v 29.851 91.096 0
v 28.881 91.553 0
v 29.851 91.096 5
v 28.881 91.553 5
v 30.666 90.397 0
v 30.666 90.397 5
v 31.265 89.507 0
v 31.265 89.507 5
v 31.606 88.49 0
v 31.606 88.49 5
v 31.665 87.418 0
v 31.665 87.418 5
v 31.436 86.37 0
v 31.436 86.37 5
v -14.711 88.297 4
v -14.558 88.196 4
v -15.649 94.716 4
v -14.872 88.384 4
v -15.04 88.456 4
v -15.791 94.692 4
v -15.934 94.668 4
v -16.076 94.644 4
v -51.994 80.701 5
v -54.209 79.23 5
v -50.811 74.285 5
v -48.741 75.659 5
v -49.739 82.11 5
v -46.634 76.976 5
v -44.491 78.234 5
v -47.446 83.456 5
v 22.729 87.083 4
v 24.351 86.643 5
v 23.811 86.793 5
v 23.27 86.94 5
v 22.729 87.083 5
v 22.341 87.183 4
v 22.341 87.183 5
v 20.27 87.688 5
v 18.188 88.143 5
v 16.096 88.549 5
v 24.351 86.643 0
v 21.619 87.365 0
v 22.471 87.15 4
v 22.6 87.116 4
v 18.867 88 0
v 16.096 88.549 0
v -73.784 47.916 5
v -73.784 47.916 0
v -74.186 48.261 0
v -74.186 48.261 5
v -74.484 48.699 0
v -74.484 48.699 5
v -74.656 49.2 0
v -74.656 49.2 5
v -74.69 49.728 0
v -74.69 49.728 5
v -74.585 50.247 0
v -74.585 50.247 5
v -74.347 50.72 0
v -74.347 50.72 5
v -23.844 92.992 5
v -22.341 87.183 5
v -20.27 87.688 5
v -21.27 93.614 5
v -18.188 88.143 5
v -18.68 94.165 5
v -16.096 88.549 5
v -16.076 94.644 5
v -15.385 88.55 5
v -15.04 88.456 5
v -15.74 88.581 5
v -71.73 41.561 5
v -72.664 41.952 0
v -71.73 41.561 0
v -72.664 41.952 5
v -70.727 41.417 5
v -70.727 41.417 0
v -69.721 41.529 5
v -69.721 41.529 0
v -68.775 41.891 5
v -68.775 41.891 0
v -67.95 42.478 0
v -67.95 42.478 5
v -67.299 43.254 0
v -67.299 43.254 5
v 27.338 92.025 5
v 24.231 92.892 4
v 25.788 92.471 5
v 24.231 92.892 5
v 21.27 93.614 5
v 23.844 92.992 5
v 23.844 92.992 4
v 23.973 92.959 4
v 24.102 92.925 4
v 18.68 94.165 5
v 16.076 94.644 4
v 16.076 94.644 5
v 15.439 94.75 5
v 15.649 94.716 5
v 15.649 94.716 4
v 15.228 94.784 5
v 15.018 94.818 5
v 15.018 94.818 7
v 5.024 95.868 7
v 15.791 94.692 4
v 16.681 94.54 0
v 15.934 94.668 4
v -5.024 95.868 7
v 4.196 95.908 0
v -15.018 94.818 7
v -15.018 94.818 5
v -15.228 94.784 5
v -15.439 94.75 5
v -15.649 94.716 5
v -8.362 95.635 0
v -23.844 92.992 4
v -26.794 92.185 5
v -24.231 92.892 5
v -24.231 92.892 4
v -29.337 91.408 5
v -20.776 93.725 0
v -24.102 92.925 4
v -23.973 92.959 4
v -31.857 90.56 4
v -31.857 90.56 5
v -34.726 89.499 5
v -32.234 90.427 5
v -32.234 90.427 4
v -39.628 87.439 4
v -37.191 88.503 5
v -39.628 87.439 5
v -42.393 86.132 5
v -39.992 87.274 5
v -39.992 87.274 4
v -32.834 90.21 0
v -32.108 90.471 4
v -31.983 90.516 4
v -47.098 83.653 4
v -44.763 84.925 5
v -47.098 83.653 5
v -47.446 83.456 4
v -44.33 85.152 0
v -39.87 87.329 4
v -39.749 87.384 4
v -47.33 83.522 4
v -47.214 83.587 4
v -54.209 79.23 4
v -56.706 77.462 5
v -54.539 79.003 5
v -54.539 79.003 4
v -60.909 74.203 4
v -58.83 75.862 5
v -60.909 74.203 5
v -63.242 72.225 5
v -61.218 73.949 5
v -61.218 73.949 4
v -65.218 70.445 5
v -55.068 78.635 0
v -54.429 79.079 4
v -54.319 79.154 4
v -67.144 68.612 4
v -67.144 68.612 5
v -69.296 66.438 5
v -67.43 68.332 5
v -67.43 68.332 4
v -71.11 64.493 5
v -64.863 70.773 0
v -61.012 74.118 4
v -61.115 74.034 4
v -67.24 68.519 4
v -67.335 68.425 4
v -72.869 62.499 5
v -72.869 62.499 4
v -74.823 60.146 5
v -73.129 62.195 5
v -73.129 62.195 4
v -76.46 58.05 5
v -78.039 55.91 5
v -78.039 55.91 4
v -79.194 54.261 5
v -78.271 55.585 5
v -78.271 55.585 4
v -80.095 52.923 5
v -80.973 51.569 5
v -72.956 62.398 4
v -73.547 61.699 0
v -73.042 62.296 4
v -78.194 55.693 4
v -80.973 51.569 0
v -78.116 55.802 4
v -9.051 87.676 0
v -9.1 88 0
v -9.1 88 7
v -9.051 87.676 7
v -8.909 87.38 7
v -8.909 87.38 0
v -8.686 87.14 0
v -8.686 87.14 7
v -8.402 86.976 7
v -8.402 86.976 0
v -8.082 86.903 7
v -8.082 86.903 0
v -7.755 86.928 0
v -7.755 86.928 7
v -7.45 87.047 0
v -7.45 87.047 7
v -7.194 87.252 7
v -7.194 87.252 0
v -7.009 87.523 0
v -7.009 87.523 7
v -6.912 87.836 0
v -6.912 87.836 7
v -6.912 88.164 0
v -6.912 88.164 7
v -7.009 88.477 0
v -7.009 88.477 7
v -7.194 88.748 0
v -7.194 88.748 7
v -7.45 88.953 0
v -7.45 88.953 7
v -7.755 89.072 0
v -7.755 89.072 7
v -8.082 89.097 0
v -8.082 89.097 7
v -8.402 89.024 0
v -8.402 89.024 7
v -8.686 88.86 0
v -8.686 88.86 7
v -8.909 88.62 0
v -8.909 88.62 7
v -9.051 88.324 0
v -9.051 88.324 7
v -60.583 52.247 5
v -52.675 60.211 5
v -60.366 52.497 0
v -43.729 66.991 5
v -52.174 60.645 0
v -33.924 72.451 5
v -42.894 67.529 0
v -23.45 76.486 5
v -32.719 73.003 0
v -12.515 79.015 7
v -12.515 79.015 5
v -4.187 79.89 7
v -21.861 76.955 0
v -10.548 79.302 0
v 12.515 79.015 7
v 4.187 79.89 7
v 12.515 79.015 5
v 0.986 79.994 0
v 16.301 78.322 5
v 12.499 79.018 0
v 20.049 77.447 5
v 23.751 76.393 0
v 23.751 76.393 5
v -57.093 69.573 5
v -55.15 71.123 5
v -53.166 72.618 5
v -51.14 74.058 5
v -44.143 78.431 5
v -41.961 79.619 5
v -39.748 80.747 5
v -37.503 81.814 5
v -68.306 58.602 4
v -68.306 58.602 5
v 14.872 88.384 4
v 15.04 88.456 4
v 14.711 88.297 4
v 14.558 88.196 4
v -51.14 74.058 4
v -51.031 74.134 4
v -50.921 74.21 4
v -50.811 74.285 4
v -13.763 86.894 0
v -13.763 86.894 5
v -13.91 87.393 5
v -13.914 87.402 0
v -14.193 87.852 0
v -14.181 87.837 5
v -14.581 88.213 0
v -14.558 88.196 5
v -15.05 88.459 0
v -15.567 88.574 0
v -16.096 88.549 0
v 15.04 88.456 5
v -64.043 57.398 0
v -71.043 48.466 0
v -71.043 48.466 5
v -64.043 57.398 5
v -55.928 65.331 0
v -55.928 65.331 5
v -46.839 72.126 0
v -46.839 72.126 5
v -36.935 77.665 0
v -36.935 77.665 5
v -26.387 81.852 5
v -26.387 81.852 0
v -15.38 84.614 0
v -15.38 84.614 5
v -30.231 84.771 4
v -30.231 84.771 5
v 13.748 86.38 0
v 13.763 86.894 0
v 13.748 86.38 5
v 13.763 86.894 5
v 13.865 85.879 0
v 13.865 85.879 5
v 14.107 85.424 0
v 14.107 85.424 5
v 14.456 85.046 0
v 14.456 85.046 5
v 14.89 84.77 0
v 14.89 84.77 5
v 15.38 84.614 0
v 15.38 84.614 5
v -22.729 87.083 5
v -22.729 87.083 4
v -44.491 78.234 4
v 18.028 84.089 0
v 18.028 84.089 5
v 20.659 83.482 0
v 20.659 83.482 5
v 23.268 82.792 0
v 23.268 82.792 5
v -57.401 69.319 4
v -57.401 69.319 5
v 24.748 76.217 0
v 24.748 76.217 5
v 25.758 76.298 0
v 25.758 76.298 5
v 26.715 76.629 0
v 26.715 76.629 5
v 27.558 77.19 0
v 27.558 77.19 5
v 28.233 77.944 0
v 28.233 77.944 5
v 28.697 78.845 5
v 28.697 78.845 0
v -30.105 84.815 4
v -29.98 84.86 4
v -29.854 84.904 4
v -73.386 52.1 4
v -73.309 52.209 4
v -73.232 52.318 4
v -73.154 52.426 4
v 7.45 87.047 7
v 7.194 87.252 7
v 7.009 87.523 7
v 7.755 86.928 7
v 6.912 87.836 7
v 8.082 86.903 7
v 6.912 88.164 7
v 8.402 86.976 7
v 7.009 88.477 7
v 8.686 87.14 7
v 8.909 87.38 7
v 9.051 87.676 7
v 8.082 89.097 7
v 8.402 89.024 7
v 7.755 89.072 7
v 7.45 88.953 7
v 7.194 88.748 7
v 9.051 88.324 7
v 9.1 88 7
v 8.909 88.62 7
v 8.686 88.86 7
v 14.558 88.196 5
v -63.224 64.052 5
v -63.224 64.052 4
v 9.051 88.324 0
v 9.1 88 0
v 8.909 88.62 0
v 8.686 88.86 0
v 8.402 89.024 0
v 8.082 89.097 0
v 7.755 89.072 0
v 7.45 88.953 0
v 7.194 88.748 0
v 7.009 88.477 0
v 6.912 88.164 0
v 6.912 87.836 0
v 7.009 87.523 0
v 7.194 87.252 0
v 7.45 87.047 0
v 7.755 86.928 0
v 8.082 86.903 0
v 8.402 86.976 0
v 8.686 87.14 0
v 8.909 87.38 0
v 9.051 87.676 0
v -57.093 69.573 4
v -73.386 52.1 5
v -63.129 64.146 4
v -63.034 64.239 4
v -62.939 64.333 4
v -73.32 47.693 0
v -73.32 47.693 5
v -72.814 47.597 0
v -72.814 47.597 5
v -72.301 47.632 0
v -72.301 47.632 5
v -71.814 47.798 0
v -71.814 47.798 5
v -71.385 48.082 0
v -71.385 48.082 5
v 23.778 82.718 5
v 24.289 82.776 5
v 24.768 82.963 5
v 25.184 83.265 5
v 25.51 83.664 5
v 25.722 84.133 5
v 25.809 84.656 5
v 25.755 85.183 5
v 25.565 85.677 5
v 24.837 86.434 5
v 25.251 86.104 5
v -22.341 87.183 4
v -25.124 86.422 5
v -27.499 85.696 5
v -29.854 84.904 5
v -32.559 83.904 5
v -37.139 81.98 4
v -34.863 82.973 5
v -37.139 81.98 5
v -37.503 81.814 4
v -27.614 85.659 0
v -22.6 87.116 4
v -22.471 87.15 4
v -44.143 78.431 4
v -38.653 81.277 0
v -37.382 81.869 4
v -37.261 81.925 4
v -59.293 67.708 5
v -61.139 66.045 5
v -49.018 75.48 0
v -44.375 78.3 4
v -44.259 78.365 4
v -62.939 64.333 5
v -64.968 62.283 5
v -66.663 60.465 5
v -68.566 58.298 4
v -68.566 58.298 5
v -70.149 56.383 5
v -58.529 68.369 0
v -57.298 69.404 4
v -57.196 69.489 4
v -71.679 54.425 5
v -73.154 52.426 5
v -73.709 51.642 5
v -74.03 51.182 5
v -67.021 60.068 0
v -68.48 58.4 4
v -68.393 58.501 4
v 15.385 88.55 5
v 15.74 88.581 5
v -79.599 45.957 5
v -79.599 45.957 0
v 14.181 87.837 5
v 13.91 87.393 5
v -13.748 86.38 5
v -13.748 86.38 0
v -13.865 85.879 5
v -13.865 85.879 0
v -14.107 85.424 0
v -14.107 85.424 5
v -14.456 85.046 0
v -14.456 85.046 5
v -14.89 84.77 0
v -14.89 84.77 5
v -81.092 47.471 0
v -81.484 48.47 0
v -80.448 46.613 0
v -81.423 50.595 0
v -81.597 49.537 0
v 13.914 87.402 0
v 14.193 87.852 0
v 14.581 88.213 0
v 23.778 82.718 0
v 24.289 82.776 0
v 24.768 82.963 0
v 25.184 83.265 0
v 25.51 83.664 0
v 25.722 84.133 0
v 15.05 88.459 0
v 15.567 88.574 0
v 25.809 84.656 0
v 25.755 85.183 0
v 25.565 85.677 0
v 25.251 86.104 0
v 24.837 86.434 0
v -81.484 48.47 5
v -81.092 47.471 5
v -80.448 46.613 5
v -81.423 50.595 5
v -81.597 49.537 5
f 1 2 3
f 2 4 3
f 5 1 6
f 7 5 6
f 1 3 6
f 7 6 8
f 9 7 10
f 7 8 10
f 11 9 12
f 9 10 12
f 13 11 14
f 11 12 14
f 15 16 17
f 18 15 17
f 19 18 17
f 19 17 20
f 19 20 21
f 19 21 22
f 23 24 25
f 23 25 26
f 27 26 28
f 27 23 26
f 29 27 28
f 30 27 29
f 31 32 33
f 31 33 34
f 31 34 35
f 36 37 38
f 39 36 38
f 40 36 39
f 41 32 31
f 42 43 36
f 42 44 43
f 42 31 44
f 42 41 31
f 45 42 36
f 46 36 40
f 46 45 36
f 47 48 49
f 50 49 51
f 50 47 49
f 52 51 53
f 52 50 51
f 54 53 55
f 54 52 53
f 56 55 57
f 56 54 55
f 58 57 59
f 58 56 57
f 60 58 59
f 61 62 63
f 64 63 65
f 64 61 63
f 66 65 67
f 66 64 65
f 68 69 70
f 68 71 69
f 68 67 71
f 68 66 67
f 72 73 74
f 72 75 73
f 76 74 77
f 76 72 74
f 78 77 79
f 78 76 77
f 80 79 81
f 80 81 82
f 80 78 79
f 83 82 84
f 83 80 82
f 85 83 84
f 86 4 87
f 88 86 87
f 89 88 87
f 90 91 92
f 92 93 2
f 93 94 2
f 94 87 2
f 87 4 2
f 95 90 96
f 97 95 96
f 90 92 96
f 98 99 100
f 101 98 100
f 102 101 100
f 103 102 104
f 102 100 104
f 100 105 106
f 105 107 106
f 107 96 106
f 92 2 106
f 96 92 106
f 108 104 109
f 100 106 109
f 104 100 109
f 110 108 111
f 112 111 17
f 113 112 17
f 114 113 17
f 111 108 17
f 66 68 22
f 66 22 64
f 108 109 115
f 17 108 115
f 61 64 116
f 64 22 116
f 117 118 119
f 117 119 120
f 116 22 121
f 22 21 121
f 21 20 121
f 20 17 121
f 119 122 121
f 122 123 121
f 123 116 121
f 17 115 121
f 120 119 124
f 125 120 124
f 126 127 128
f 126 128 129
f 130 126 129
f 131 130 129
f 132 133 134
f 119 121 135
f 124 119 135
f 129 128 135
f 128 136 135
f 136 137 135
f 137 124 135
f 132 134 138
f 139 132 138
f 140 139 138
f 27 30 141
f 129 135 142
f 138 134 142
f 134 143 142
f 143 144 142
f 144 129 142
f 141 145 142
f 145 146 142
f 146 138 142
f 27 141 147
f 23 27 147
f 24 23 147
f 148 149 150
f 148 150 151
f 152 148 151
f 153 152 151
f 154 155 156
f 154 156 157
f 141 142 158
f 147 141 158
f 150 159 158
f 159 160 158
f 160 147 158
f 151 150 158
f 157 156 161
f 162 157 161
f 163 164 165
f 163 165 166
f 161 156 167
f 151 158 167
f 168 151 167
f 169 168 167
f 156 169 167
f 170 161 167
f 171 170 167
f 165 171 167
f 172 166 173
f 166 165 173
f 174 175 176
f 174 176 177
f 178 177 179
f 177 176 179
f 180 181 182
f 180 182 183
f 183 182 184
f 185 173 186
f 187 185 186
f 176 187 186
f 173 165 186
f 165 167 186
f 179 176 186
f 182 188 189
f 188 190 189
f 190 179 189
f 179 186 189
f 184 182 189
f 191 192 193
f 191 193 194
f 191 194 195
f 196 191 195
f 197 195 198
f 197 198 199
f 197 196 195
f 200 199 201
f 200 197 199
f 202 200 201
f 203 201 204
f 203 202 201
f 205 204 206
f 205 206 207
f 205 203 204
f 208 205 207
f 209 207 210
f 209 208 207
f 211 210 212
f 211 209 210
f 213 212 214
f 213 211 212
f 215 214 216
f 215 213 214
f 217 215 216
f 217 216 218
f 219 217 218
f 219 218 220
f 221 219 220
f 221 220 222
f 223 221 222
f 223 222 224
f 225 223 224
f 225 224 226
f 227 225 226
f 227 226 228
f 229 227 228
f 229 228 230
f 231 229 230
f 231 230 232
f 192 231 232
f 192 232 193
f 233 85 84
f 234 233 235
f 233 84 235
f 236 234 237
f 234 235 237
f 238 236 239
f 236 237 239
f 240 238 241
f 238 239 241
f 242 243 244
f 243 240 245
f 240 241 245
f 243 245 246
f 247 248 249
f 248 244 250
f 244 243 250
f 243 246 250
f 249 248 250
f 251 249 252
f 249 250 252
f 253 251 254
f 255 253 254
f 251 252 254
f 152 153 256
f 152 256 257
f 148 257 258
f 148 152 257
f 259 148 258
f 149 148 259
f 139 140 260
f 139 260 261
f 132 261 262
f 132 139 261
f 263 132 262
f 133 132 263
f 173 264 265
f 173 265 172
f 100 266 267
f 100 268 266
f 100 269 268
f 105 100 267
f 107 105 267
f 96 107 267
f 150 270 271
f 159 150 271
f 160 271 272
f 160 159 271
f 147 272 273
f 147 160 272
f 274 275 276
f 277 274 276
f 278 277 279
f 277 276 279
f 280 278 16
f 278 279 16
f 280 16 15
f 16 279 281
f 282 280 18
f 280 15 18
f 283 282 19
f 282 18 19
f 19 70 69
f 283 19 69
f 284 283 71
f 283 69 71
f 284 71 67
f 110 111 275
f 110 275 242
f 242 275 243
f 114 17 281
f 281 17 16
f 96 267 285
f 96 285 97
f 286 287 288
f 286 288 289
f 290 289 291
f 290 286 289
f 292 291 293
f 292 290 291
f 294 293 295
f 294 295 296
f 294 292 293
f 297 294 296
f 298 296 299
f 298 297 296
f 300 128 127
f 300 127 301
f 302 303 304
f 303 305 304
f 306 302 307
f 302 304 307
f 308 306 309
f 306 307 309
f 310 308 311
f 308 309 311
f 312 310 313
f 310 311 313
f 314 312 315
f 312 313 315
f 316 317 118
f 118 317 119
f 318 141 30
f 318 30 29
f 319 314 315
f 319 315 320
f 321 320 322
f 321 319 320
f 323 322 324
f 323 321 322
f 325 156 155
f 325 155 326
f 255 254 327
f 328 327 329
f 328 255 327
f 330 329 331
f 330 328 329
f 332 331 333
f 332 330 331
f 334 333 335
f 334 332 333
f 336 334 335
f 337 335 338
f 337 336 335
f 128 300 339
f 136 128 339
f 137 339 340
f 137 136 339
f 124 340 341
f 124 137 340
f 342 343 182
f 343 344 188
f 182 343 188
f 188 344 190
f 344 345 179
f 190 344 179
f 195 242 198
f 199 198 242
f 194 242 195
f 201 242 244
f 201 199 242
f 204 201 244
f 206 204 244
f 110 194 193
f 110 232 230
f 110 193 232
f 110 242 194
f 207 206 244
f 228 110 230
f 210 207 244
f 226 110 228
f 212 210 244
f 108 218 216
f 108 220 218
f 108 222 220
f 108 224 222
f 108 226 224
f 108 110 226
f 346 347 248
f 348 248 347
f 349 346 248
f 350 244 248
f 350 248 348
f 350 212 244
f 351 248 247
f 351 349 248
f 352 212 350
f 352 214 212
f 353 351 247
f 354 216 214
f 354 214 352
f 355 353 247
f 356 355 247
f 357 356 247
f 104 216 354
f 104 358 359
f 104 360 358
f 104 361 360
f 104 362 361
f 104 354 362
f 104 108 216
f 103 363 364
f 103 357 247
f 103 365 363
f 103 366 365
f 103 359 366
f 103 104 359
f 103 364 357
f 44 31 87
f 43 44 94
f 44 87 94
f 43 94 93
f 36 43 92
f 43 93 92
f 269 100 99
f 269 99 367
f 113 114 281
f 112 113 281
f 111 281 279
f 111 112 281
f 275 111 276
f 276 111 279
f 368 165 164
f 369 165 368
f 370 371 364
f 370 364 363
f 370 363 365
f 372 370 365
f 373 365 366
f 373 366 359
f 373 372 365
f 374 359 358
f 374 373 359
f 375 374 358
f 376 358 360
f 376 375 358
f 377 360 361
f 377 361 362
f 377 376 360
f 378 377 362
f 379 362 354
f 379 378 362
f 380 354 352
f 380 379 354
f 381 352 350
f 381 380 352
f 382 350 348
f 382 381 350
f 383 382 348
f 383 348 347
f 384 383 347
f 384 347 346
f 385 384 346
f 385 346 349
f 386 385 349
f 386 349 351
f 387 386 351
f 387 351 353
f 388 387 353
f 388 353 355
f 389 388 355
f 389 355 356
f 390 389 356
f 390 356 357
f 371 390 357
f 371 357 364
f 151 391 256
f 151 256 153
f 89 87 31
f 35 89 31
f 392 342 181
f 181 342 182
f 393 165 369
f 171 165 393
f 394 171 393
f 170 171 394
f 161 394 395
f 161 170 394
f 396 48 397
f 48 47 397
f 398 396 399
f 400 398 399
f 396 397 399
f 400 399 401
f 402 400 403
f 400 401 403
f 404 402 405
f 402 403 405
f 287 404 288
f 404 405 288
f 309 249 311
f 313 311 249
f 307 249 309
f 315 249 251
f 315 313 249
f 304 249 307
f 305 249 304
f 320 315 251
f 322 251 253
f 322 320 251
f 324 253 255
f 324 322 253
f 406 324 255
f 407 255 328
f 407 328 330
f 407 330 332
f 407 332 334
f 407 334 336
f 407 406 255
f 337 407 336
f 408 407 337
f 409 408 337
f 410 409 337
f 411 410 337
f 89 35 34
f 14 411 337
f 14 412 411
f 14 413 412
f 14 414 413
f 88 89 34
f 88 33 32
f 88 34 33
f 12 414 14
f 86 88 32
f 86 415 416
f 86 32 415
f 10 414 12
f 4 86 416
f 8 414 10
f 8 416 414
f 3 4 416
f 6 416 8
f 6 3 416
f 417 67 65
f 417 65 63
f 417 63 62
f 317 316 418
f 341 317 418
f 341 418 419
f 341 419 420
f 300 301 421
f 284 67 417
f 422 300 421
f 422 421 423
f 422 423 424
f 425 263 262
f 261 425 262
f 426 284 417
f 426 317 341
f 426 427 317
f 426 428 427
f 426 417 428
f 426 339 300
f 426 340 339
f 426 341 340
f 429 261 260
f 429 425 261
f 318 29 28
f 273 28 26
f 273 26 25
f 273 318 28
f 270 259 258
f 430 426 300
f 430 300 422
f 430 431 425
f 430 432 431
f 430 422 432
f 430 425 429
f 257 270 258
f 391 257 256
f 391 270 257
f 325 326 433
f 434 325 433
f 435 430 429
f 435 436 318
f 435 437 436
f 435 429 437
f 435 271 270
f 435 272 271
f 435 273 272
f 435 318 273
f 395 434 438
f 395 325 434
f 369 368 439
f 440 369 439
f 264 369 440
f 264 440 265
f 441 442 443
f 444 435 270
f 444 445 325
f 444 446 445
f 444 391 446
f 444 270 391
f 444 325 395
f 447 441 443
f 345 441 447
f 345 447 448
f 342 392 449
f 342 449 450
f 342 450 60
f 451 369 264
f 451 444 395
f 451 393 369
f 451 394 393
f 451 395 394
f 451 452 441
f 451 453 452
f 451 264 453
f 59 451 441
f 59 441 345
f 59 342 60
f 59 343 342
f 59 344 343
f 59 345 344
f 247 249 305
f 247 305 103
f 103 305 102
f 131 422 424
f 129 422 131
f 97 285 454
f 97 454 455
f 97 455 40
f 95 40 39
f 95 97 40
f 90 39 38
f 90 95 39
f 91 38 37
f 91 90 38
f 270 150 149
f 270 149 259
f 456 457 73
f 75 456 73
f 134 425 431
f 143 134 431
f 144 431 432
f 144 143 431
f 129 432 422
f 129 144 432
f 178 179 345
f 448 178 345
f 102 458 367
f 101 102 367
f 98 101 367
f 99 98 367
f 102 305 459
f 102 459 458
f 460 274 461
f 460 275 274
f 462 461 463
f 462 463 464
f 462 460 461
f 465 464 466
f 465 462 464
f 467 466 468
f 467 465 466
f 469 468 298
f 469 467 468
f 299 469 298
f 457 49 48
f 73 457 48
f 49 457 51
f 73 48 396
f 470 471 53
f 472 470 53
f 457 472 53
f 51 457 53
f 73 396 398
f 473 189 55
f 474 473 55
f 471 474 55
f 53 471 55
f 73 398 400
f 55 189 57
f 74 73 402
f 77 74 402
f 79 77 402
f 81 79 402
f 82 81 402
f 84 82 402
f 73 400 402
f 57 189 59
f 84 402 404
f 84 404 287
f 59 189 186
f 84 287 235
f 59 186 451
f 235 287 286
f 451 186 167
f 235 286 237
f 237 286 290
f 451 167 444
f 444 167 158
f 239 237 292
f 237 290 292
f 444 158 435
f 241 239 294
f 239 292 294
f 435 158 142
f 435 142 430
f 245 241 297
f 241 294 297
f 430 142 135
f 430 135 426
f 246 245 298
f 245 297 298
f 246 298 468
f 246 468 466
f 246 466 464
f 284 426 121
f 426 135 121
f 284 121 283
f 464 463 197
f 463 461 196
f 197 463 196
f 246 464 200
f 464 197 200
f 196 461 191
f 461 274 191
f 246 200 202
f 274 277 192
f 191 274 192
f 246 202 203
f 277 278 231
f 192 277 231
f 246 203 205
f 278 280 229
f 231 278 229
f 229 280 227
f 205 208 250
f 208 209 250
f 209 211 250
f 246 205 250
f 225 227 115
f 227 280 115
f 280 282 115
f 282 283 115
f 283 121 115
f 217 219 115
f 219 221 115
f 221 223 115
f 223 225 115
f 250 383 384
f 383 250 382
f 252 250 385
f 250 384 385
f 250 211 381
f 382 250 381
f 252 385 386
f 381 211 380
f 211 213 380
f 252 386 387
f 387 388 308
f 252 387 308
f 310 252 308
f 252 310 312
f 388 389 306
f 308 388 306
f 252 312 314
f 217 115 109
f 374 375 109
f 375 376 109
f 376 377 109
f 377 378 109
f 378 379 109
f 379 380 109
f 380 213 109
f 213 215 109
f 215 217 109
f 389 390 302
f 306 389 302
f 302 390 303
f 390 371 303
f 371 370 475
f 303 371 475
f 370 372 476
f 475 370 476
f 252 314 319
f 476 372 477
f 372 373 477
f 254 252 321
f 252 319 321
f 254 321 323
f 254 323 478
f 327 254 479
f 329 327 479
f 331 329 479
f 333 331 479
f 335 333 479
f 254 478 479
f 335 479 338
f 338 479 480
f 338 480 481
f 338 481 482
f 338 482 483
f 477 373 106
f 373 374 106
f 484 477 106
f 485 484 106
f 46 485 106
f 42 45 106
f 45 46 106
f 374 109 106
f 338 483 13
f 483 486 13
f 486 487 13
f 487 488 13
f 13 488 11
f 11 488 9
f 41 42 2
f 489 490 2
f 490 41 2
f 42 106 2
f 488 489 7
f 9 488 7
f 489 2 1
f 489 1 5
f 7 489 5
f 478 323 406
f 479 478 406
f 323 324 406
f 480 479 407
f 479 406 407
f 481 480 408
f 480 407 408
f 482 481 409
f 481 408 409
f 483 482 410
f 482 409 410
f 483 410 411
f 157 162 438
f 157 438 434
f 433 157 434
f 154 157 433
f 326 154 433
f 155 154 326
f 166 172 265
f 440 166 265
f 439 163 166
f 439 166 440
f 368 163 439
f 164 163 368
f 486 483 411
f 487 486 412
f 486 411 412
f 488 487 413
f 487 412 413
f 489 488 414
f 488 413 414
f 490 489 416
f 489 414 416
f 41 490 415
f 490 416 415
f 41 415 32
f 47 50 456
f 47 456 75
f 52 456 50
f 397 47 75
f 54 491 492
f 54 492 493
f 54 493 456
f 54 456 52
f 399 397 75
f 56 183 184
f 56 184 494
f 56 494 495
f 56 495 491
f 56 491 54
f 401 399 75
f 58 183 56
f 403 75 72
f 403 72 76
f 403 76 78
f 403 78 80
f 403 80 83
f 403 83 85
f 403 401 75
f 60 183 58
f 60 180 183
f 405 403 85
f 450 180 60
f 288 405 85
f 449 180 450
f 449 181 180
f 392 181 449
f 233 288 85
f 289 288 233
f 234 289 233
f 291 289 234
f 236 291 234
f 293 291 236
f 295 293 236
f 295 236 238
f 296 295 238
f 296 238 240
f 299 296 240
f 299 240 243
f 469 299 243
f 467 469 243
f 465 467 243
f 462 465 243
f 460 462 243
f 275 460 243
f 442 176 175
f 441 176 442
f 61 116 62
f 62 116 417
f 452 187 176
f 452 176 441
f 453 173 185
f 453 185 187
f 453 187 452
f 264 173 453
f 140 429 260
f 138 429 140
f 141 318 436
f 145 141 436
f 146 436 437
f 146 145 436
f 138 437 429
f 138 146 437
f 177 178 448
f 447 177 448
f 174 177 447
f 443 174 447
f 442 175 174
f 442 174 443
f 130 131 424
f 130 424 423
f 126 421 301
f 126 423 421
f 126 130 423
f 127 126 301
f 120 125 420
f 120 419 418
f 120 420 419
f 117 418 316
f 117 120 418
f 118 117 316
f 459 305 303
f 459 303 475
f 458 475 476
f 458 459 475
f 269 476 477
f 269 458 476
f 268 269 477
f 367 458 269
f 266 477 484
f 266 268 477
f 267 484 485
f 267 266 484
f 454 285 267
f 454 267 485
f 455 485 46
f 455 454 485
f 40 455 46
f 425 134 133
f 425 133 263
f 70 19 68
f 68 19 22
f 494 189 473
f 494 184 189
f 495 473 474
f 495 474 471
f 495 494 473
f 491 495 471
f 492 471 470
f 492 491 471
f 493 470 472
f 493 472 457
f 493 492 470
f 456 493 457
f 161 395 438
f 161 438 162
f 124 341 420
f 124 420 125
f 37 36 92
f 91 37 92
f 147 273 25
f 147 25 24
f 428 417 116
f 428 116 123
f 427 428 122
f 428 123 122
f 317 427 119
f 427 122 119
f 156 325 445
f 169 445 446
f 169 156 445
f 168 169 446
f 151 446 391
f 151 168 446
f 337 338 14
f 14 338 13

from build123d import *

# Parameters (mm, degrees)
BOSS_EXTRUDE1_DEPTH = 5
SKETCH1_3_R         = 1.1000000000006245
SKETCH1_3_R_2       = 1.1000000000006236
BOSS_EXTRUDE2_DEPTH = 7
SKETCH1_6_R         = 1.1000000000006236
SKETCH1_6_R_2       = 1.1000000000006245
CUT_EXTRUDE3_DEPTH  = 5
FILLET1_R           = 4
FILLET2_R           = 2
CUT_EXTRUDE8_START  = 4
CUT_EXTRUDE8_DEPTH  = 1


with BuildPart() as part:
    # Sketch1 → Boss-Extrude1 (new body)
    with BuildSketch(Plane.XY):
        with BuildLine():
            Line((-83.13843876330769, 48.0000000000023), (-69.28203230275663, 40.00000000000234))
            ThreePointArc((-69.28203230275663, 40.00000000000234), (-27.361611466054974, 75.17540966287518), (27.361611466052146, 75.17540966287518))
            Line((27.361611466052146, 75.17540966287518), (32.833933759262855, 90.21049159544972))
            ThreePointArc((32.833933759262855, 90.21049159544972), (-32.83393375926571, 90.21049159544971), (-83.13843876330769, 48.0000000000023))
        make_face()
    extrude(amount=BOSS_EXTRUDE1_DEPTH)

    # Sketch1<3> → Boss-Extrude2 (add)
    with BuildSketch(Plane.XY):
        with BuildLine():
            Line((-13.453363993461283, 84.94119729118435), (-12.514757203219895, 79.01506724761352))
            ThreePointArc((-12.514757203219894, 79.01506724761353), (-1.39977e-12, 80.00000000000253), (12.514757203217084, 79.01506724761356))
            Line((12.514757203217078, 79.01506724761352), (13.453363993458465, 84.94119729118435))
            Line((13.453363993458465, 84.94119729118435), (14.079101853619393, 88.89195065356492))
            Line((14.079101853619393, 88.89195065356492), (15.017708643860779, 94.81808069713574))
            ThreePointArc((15.017708643860784, 94.81808069713577), (-1.40067e-12, 96.00000000000256), (-15.017708643863598, 94.81808069713577))
            Line((-15.017708643863596, 94.81808069713574), (-14.07910185362221, 88.89195065356492))
            Line((-14.07910185362221, 88.89195065356492), (-13.453363993461283, 84.94119729118435))
        make_face()
        with Locations(Location((-8.000000000001409, 88.00000000000252, 0), (0, 0, 180))):
            Circle(SKETCH1_3_R, mode=Mode.SUBTRACT)
        with Locations((7.999999999998591, 88.00000000000252)):
            Circle(SKETCH1_3_R_2, mode=Mode.SUBTRACT)
    extrude(amount=BOSS_EXTRUDE2_DEPTH)

    # Sketch1<6> → Cut-Extrude3 (cut)
    with BuildSketch(Plane.XY):
        with BuildLine():
            Line((-75.48035111508972, 49.01751315135477), (-72.125668843308, 46.83895701129465))
            ThreePointArc((-72.12566884330799, 46.83895701129467), (-46.83895701129383, 72.12566884330892), (-13.453363993461279, 84.94119729118435))
            Line((-13.453363993461283, 84.94119729118435), (-14.07910185362221, 88.89195065356492))
            ThreePointArc((-14.079101853622205, 88.89195065356492), (-49.01751315135395, 75.4803511150906), (-75.48035111508973, 49.01751315135477))
        make_face()
        with BuildLine():
            Line((14.079101853619393, 88.89195065356492), (13.453363993458465, 84.94119729118435))
            ThreePointArc((13.453363993458456, 84.94119729118435), (19.345790673570992, 83.79582557153273), (25.14396660615395, 82.24220901282357))
            Line((25.143966606153956, 82.24220901282357), (26.31345342504491, 86.06742803667572))
            ThreePointArc((26.31345342504492, 86.06742803667575), (20.245594890946464, 87.69330583067372), (14.079101853619395, 88.89195065356492))
        make_face()
        with Locations((7.999999999998591, 88.00000000000252)):
            Circle(SKETCH1_6_R)
        with Locations(Location((-8.000000000001409, 88.00000000000252, 0), (0, 0, 180))):
            Circle(SKETCH1_6_R_2)
    extrude(amount=CUT_EXTRUDE3_DEPTH, mode=Mode.SUBTRACT)

    # Fillet1
    fillet1_edges = [part.edges().sort_by_distance(p)[0] for p in [
        (27.361611466052143, 75.17540966287518, 2.5),
        (-69.28203230275663, 40.000000000002345, 2.5),
        (-83.1384387633077, 48.0000000000023, 2.5),
        (32.83393375926286, 90.21049159544972, 2.5),
    ]]
    fillet(fillet1_edges, radius=FILLET1_R)

    # Fillet2
    fillet2_edges = [part.edges().sort_by_distance(p)[0] for p in [
        (13.45336399345846, 84.94119729118435, 2.5),
        (14.079101853619393, 88.89195065356492, 2.5),
        (-13.45336399346129, 84.94119729118435, 2.5),
        (-14.079101853622209, 88.89195065356492, 2.5),
        (-72.125668843308, 46.83895701129467, 2.5),
        (-75.48035111508975, 49.01751315135476, 2.5),
        (26.313453425044912, 86.06742803667574, 2.5),
        (25.143966606153953, 82.24220901282357, 2.5),
    ]]
    fillet(fillet2_edges, radius=FILLET2_R - 0.0001)  # a hair under: the kernel refuses the full size

    # Sketch1<11> → Cut-Extrude8 (cut)
    with BuildSketch(Plane.XY.offset(CUT_EXTRUDE8_START)):
        with BuildLine():
            ThreePointArc((-60.90905171355247, 74.20301489398085), (-61.063509146668466, 74.07596000522229), (-61.21770154690506, 73.9485836058718))
            Line((-61.21770154690517, 73.9485836058717), (-57.40122339078805, 69.31882538850002))
            ThreePointArc((-57.40122339078971, 69.31882538849865), (-57.247039825001984, 69.44621250489581), (-57.092573557434, 69.5732566766103))
            Line((-57.09257355743297, 69.57325667661115), (-60.909051713550085, 74.20301489398283))
        make_face()
        with BuildLine():
            ThreePointArc((-67.14449326003556, 68.61207637765807), (-67.28728937278758, 68.47204311880354), (-67.42979343969591, 68.33171267193941))
            Line((-67.42979343969681, 68.33171267193853), (-63.22432811901289, 64.05220007072279))
            ThreePointArc((-63.22432811901119, 64.05220007072444), (-63.081833786988334, 64.19254042387854), (-62.939027939352314, 64.33256377644165))
            Line((-62.93902793935119, 64.33256377644273), (-67.14449326003512, 68.61207637765848))
        make_face()
        with BuildLine():
            ThreePointArc((-72.86892466985591, 62.49895853099788), (-72.9989726976045, 62.34701263970007), (-73.12870388919032, 62.19479614475513))
            Line((-73.12870388918984, 62.19479614475569), (-68.5662575343589, 58.298098834631475))
            ThreePointArc((-68.56625753435887, 58.298098834631524), (-68.43653690400481, 58.45032434971835), (-68.30647831502658, 58.60226122087179))
            Line((-68.30647831502684, 58.60226122087151), (-72.86892466985778, 62.498958530995715))
        make_face()
        with BuildLine():
            Line((16.639553027860302, 100.6343880514797), (14.331087155641026, 86.8395399557962))
            ThreePointArc((14.331087155641026, 86.8395399557962), (14.54451947105813, 86.80404778668378), (14.757863892002872, 86.76803104912538))
            Line((14.757863892002872, 86.76803104912538), (17.066344573354787, 100.56296764072263))
            Line((17.066344573354787, 100.56296764072263), (16.639553027860302, 100.6343880514797))
        make_face()
        with BuildLine():
            Line((25.73337251273005, 98.70106424012083), (22.231449806724747, 85.16013385550725))
            ThreePointArc((22.231449806724747, 85.16013385550725), (22.037877706171837, 85.21043190246515), (21.844191809986345, 85.26028995356089))
            Line((21.844191809986345, 85.26028995356089), (25.34611345657903, 98.80121624174181))
            Line((25.34611345657903, 98.80121624174181), (25.73337251273005, 98.70106424012083))
        make_face()
        with BuildLine():
            Line((42.116005821693015, 92.89966951845646), (36.3159273051723, 80.17255878891613))
            ThreePointArc((36.3159273051723, 80.17255878891613), (36.49801466794809, 80.08982884296243), (36.67991356817236, 80.00668534208985))
            Line((36.67991356817236, 80.00668534208985), (42.47999033003967, 92.733792221395))
            Line((42.47999033003967, 92.733792221395), (42.116005821693015, 92.89966951845646))
        make_face()
        with BuildLine():
            Line((-16.639553027863123, 100.6343880514797), (-14.331087155646365, 86.83953995579603))
            ThreePointArc((-14.331087155646365, 86.83953995579603), (-14.544519471062088, 86.80404778668402), (-14.757863892005375, 86.76803104912547))
            Line((-14.757863892005375, 86.76803104912547), (-17.066344573355888, 100.56296764072306))
            Line((-17.066344573355888, 100.56296764072306), (-16.639553027863123, 100.6343880514797))
        make_face()
        with BuildLine():
            Line((-25.346113456581847, 98.80121624174181), (-21.8441918099951, 85.26028995355922))
            ThreePointArc((-21.8441918099951, 85.26028995355922), (-22.03787770624786, 85.21043190244556), (-22.231449806868046, 85.16013385546994))
            Line((-22.231449806868046, 85.16013385546994), (-25.733372512730377, 98.70106424012063))
            Line((-25.733372512730377, 98.70106424012063), (-25.346113456581847, 98.80121624174181))
        make_face()
        with BuildLine():
            Line((-34.251374684060885, 96.12374945737389), (-29.568170243810847, 82.89878809264937))
            ThreePointArc((-29.568170243810847, 82.89878809264937), (-29.379717798712498, 82.96576366709935), (-29.191113647373975, 83.03231083634289))
            Line((-29.191113647373975, 83.03231083634289), (-33.87431808762401, 96.25727220106741))
            Line((-33.87431808762401, 96.25727220106741), (-34.251374684060885, 96.12374945737389))
        make_face()
        with BuildLine():
            Line((-42.47999033004247, 92.73379222139498), (-36.67991356817387, 80.00668534209034))
            ThreePointArc((-36.67991356817387, 80.00668534209034), (-36.49801466794875, 80.0898288429634), (-36.31592730517207, 80.1725587889175))
            Line((-36.31592730517207, 80.1725587889175), (-42.11600582169416, 92.89966951845659))
            Line((-42.11600582169416, 92.89966951845659), (-42.47999033004247, 92.73379222139498))
        make_face()
        with BuildLine():
            Line((-50.40062368063963, 88.67853703576704), (-43.51337750884637, 76.50537063873087))
            ThreePointArc((-43.51337750884637, 76.50537063873087), (-43.33941722242662, 76.6040512872355), (-43.16523314692608, 76.70233638011615))
            Line((-43.16523314692608, 76.70233638011615), (-50.052481402265904, 88.87550645980734))
            Line((-50.052481402265904, 88.87550645980734), (-50.40062368063963, 88.67853703576704))
        make_face()
        with BuildLine():
            Line((-57.937677852298485, 83.94838463773227), (-50.01567837258084, 72.42180386960484))
            ThreePointArc((-50.01567837258084, 72.42180386960484), (-49.850980642786205, 72.53527064642093), (-49.68602550055159, 72.64836287732517))
            Line((-49.68602550055159, 72.64836287732517), (-57.6080273768518, 84.17494713250092))
            Line((-57.6080273768518, 84.17494713250092), (-57.937677852298485, 83.94838463773227))
        make_face()
        with BuildLine():
            Line((-82.9591200723337, 59.41983064866502), (-71.53733737082064, 51.27275222465001))
            ThreePointArc((-71.53733737082064, 51.27275222465001), (-71.653662958767, 51.11006107791678), (-71.769618553105, 50.94710601730748))
            Line((-71.769618553105, 50.94710601730748), (-83.19140125461807, 59.09418444132249))
            Line((-83.19140125461807, 59.09418444132249), (-82.9591200723337, 59.41983064866502))
        make_face()
    extrude(amount=CUT_EXTRUDE8_DEPTH, mode=Mode.SUBTRACT)


solid = part.part
